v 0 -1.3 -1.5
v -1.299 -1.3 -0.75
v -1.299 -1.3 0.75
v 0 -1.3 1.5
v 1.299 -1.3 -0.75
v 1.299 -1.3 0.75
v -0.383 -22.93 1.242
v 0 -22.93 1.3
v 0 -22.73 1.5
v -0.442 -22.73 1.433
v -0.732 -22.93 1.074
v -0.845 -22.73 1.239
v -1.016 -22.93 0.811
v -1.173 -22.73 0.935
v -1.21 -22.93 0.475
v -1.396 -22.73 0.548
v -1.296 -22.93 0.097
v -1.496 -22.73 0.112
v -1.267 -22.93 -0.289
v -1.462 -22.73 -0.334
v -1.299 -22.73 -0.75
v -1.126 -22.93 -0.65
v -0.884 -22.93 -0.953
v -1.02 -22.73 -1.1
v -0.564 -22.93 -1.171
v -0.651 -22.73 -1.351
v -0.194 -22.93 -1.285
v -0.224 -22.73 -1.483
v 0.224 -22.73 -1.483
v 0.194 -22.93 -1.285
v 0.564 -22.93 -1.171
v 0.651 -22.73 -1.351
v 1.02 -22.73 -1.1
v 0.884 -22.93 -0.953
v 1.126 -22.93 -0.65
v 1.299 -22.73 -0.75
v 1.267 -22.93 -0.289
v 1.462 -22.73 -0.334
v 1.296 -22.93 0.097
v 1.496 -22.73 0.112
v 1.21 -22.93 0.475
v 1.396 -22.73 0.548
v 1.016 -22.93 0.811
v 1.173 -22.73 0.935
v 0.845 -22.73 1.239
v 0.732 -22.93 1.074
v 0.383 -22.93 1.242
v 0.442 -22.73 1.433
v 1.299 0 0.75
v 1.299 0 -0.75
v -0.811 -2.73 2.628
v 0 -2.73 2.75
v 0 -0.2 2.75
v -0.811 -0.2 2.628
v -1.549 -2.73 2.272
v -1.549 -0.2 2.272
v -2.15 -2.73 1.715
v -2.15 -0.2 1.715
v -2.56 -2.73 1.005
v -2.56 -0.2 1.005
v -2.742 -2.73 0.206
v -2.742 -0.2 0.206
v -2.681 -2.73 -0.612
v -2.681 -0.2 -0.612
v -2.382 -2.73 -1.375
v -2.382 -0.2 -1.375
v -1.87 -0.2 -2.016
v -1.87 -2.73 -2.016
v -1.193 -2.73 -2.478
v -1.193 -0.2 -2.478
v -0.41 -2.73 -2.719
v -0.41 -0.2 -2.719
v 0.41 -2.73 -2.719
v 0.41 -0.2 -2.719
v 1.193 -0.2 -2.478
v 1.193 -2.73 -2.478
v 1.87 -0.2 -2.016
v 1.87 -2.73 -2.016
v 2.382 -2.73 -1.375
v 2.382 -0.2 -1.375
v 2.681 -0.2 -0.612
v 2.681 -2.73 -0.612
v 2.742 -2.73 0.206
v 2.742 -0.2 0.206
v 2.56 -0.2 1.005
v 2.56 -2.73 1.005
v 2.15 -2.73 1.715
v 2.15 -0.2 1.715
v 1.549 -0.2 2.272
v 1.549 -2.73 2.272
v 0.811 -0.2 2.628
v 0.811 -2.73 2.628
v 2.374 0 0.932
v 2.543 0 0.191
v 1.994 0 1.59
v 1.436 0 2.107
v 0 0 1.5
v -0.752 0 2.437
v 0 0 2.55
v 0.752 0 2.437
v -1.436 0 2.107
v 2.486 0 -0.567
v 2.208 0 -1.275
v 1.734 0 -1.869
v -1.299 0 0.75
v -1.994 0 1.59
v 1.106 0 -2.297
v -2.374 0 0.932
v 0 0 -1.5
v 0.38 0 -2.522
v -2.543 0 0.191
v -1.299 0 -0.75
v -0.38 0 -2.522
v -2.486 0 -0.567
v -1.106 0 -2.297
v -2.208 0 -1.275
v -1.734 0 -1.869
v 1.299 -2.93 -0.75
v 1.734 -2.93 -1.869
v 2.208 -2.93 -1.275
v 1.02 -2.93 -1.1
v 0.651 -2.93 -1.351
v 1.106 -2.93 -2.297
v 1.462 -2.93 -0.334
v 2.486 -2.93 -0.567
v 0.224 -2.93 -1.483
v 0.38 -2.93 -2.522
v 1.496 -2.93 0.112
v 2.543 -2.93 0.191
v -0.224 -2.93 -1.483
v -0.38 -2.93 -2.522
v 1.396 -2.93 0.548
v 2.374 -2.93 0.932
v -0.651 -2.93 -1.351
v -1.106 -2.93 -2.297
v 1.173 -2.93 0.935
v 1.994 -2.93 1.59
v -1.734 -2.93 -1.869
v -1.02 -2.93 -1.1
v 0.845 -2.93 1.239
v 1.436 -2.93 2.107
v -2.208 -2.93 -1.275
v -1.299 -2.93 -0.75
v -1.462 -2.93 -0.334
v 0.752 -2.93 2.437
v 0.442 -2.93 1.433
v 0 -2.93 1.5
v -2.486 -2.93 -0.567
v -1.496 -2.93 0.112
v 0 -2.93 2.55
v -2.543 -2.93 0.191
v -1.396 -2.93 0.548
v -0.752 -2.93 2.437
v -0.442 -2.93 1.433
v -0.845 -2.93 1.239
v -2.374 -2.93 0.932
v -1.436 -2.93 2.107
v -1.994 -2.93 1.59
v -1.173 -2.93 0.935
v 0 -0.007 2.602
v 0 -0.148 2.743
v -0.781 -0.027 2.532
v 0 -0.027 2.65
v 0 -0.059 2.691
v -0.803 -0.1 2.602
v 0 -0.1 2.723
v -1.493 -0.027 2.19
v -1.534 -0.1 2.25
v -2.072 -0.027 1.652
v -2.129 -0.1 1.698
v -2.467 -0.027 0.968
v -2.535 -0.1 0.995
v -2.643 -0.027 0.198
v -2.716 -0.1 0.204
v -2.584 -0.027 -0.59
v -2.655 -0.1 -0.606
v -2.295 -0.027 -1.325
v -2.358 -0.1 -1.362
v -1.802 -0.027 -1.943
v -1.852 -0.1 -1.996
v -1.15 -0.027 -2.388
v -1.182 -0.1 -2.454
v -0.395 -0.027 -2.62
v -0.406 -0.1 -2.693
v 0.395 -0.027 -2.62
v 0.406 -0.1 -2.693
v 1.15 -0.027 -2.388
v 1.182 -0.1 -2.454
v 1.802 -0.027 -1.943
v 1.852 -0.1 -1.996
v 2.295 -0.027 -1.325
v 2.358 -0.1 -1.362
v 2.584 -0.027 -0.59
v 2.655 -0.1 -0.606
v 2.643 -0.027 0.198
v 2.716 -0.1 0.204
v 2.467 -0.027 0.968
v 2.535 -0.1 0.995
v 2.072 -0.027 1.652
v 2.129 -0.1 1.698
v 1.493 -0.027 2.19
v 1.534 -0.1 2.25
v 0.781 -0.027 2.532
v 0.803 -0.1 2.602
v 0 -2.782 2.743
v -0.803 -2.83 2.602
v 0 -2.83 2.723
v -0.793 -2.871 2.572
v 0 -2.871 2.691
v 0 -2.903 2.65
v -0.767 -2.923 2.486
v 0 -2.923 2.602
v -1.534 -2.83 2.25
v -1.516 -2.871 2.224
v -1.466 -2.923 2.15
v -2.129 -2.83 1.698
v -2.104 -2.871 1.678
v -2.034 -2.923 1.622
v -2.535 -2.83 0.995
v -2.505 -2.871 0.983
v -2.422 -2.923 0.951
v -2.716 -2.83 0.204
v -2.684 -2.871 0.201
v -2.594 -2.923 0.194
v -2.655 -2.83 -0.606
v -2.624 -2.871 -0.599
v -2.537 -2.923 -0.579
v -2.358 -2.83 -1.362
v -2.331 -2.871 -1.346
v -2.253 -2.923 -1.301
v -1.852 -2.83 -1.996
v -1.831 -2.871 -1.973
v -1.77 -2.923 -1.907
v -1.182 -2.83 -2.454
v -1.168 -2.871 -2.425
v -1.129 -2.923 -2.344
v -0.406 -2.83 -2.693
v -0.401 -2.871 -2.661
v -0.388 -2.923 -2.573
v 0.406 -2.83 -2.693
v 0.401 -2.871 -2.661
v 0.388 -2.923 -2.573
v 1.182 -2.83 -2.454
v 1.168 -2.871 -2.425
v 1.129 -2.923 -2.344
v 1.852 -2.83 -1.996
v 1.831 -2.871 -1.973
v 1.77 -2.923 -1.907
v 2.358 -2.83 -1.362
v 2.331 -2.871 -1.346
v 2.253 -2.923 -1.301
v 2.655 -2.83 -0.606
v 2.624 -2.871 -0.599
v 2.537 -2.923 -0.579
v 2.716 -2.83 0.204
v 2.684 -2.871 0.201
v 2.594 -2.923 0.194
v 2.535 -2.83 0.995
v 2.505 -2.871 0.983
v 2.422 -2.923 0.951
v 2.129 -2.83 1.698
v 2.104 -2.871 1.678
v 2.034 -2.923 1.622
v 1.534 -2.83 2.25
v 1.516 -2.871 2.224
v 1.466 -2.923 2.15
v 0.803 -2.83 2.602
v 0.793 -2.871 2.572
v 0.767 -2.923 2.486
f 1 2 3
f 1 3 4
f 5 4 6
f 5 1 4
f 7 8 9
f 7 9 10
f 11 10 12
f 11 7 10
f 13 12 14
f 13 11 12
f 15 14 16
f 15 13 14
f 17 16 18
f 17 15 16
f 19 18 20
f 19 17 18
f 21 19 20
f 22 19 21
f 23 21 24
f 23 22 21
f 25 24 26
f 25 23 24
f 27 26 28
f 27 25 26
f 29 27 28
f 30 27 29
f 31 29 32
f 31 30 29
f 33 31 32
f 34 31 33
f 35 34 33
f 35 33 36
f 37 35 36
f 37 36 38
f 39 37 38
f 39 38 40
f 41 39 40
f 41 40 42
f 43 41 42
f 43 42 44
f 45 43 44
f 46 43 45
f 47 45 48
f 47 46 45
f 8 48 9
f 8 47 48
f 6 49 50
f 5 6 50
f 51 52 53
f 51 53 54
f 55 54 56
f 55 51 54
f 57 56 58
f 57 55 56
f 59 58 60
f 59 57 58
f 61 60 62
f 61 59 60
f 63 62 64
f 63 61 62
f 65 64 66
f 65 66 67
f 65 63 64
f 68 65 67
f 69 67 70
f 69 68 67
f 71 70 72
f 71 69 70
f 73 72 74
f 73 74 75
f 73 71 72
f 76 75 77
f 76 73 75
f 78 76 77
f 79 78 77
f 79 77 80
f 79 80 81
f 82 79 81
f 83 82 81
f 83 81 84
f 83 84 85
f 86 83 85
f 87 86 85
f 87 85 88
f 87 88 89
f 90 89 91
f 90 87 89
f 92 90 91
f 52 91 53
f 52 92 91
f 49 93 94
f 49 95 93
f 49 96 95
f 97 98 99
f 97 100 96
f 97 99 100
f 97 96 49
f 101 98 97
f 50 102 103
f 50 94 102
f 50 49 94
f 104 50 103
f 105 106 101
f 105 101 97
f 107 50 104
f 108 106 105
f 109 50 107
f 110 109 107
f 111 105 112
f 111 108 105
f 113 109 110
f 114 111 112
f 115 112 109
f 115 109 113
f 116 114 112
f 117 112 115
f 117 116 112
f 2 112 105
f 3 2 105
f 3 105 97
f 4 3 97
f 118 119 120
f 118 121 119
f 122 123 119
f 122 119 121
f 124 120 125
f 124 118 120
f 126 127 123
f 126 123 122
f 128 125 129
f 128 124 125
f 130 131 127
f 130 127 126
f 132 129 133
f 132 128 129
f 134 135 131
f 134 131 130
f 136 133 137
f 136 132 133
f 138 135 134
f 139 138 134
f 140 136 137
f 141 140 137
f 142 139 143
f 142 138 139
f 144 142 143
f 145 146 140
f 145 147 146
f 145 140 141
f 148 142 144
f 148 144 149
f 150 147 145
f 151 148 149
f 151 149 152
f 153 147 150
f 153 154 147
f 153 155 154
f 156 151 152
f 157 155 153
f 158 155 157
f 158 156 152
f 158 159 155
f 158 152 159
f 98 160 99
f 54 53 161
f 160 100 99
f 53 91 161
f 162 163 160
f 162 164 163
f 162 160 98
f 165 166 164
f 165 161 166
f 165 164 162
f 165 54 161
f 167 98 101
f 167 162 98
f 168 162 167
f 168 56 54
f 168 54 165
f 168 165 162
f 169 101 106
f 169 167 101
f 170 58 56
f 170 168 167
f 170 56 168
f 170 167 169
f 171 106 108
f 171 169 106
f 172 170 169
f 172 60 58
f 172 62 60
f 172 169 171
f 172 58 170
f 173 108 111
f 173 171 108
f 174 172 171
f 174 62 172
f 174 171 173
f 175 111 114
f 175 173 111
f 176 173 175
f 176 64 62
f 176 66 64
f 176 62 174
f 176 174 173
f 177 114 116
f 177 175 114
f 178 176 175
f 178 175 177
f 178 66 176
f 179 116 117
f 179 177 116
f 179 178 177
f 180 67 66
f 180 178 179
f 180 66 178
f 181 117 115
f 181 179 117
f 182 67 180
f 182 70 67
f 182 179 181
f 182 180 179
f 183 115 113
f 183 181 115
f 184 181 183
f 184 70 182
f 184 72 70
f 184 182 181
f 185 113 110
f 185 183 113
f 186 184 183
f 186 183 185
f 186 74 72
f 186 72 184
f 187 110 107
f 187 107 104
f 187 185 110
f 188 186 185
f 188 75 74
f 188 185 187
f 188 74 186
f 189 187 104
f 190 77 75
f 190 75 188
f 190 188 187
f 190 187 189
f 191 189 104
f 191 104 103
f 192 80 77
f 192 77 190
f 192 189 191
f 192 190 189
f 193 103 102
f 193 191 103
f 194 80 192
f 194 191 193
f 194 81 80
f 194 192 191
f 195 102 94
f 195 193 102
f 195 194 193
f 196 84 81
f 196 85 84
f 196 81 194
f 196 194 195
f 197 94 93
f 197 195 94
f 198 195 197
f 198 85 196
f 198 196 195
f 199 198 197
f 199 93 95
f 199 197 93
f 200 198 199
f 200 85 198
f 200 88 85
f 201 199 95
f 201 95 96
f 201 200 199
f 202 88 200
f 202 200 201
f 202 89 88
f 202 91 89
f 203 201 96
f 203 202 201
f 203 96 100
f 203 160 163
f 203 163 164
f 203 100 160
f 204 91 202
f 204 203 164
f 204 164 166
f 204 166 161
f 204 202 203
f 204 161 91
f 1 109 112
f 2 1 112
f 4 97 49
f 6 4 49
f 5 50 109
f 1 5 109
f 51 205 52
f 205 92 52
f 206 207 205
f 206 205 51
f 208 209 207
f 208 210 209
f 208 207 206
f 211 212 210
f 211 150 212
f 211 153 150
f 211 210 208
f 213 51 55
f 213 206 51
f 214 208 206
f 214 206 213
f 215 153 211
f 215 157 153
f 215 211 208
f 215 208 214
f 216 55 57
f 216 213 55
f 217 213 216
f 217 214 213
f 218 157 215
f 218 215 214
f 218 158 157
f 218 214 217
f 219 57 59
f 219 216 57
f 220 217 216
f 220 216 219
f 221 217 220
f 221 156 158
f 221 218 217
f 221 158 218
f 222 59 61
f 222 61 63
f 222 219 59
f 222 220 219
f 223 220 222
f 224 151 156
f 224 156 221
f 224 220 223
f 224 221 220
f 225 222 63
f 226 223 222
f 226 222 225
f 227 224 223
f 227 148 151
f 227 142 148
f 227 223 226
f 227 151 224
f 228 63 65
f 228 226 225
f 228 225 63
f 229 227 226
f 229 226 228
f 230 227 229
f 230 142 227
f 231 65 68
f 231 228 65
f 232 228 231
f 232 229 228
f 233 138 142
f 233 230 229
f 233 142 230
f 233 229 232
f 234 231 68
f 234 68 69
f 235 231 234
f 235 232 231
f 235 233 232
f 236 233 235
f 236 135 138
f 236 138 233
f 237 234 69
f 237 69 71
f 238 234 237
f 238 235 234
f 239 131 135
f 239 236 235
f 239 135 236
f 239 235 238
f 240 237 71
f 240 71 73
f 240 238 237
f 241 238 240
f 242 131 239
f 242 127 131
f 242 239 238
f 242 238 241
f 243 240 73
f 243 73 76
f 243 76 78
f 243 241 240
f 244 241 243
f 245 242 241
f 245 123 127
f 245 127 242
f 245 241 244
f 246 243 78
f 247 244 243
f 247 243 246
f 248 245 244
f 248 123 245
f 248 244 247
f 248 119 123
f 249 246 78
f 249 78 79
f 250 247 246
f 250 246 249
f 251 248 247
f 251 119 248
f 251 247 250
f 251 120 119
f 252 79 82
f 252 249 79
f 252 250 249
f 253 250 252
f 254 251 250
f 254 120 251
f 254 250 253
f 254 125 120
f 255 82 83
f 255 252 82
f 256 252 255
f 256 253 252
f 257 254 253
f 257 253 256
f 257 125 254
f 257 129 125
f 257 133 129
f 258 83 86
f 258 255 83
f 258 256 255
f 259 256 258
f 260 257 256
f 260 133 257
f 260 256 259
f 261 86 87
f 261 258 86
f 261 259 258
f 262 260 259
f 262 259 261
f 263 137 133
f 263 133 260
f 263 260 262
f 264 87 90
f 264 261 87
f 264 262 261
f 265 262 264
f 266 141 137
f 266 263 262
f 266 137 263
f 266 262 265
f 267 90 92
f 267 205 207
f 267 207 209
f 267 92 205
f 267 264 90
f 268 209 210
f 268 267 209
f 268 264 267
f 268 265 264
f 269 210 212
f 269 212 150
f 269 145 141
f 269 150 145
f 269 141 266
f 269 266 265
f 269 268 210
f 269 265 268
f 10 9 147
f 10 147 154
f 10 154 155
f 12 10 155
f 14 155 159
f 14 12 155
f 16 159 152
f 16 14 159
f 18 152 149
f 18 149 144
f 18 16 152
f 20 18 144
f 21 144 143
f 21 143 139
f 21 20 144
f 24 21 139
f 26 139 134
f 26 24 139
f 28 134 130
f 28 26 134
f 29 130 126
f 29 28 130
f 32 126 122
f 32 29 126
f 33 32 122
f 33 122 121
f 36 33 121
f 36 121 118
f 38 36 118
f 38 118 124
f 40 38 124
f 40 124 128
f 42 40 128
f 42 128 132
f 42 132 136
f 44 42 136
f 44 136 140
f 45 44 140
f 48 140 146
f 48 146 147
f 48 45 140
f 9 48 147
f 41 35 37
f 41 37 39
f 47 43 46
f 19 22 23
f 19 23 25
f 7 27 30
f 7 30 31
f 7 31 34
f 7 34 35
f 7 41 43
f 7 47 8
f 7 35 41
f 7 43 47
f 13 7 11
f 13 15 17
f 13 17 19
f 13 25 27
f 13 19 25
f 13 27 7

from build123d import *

# Parameters (mm, degrees)
CUT_EXTRUDE_1_DEPTH = 1.3
FILLET_1_R          = 0.2
CHAMFER_1_SIZE      = 0.2


with BuildPart() as part:
    # 草图1 → 旋转1 (revolve)
    with BuildSketch(Plane.XY, mode=Mode.PRIVATE) as revolve_1_sk:
        Polygon((0, 0), (2.75, 0), (2.75, -2.93), (1.5, -2.93), (1.5, -22.93), (0, -22.93), align=None)
    revolve(revolve_1_sk.sketch.rotate(Axis((0, 0, 0), (0, -1, 0)), 90), axis=Axis((0, 0, 0), (0, -1, 0)))

    # 草图2 → 切除-拉伸1 (cut)
    with BuildSketch(Plane(origin=(0, 0, 0), x_dir=(1, 0, 0), z_dir=(0, 1, 0))):
        Polygon((0, 1.5), (-1.299038106, 0.75), (-1.299038106, -0.75), (0, -1.5), (1.299038106, -0.75), (1.299038106, 0.75), align=None)
    extrude(amount=-CUT_EXTRUDE_1_DEPTH, mode=Mode.SUBTRACT)

    # 圆角1
    fillet_1_edges = [part.edges().sort_by_distance(p)[0] for p in [
        (0, -2.93, -2.75),
        (0, 0, -2.75),
    ]]
    fillet(fillet_1_edges, radius=FILLET_1_R)

    # 倒角1
    chamfer_1_edges = [part.edges().sort_by_distance(p)[0] for p in [
        (0, -22.93, -1.5),
    ]]
    chamfer(chamfer_1_edges, length=CHAMFER_1_SIZE)


solid = part.part
